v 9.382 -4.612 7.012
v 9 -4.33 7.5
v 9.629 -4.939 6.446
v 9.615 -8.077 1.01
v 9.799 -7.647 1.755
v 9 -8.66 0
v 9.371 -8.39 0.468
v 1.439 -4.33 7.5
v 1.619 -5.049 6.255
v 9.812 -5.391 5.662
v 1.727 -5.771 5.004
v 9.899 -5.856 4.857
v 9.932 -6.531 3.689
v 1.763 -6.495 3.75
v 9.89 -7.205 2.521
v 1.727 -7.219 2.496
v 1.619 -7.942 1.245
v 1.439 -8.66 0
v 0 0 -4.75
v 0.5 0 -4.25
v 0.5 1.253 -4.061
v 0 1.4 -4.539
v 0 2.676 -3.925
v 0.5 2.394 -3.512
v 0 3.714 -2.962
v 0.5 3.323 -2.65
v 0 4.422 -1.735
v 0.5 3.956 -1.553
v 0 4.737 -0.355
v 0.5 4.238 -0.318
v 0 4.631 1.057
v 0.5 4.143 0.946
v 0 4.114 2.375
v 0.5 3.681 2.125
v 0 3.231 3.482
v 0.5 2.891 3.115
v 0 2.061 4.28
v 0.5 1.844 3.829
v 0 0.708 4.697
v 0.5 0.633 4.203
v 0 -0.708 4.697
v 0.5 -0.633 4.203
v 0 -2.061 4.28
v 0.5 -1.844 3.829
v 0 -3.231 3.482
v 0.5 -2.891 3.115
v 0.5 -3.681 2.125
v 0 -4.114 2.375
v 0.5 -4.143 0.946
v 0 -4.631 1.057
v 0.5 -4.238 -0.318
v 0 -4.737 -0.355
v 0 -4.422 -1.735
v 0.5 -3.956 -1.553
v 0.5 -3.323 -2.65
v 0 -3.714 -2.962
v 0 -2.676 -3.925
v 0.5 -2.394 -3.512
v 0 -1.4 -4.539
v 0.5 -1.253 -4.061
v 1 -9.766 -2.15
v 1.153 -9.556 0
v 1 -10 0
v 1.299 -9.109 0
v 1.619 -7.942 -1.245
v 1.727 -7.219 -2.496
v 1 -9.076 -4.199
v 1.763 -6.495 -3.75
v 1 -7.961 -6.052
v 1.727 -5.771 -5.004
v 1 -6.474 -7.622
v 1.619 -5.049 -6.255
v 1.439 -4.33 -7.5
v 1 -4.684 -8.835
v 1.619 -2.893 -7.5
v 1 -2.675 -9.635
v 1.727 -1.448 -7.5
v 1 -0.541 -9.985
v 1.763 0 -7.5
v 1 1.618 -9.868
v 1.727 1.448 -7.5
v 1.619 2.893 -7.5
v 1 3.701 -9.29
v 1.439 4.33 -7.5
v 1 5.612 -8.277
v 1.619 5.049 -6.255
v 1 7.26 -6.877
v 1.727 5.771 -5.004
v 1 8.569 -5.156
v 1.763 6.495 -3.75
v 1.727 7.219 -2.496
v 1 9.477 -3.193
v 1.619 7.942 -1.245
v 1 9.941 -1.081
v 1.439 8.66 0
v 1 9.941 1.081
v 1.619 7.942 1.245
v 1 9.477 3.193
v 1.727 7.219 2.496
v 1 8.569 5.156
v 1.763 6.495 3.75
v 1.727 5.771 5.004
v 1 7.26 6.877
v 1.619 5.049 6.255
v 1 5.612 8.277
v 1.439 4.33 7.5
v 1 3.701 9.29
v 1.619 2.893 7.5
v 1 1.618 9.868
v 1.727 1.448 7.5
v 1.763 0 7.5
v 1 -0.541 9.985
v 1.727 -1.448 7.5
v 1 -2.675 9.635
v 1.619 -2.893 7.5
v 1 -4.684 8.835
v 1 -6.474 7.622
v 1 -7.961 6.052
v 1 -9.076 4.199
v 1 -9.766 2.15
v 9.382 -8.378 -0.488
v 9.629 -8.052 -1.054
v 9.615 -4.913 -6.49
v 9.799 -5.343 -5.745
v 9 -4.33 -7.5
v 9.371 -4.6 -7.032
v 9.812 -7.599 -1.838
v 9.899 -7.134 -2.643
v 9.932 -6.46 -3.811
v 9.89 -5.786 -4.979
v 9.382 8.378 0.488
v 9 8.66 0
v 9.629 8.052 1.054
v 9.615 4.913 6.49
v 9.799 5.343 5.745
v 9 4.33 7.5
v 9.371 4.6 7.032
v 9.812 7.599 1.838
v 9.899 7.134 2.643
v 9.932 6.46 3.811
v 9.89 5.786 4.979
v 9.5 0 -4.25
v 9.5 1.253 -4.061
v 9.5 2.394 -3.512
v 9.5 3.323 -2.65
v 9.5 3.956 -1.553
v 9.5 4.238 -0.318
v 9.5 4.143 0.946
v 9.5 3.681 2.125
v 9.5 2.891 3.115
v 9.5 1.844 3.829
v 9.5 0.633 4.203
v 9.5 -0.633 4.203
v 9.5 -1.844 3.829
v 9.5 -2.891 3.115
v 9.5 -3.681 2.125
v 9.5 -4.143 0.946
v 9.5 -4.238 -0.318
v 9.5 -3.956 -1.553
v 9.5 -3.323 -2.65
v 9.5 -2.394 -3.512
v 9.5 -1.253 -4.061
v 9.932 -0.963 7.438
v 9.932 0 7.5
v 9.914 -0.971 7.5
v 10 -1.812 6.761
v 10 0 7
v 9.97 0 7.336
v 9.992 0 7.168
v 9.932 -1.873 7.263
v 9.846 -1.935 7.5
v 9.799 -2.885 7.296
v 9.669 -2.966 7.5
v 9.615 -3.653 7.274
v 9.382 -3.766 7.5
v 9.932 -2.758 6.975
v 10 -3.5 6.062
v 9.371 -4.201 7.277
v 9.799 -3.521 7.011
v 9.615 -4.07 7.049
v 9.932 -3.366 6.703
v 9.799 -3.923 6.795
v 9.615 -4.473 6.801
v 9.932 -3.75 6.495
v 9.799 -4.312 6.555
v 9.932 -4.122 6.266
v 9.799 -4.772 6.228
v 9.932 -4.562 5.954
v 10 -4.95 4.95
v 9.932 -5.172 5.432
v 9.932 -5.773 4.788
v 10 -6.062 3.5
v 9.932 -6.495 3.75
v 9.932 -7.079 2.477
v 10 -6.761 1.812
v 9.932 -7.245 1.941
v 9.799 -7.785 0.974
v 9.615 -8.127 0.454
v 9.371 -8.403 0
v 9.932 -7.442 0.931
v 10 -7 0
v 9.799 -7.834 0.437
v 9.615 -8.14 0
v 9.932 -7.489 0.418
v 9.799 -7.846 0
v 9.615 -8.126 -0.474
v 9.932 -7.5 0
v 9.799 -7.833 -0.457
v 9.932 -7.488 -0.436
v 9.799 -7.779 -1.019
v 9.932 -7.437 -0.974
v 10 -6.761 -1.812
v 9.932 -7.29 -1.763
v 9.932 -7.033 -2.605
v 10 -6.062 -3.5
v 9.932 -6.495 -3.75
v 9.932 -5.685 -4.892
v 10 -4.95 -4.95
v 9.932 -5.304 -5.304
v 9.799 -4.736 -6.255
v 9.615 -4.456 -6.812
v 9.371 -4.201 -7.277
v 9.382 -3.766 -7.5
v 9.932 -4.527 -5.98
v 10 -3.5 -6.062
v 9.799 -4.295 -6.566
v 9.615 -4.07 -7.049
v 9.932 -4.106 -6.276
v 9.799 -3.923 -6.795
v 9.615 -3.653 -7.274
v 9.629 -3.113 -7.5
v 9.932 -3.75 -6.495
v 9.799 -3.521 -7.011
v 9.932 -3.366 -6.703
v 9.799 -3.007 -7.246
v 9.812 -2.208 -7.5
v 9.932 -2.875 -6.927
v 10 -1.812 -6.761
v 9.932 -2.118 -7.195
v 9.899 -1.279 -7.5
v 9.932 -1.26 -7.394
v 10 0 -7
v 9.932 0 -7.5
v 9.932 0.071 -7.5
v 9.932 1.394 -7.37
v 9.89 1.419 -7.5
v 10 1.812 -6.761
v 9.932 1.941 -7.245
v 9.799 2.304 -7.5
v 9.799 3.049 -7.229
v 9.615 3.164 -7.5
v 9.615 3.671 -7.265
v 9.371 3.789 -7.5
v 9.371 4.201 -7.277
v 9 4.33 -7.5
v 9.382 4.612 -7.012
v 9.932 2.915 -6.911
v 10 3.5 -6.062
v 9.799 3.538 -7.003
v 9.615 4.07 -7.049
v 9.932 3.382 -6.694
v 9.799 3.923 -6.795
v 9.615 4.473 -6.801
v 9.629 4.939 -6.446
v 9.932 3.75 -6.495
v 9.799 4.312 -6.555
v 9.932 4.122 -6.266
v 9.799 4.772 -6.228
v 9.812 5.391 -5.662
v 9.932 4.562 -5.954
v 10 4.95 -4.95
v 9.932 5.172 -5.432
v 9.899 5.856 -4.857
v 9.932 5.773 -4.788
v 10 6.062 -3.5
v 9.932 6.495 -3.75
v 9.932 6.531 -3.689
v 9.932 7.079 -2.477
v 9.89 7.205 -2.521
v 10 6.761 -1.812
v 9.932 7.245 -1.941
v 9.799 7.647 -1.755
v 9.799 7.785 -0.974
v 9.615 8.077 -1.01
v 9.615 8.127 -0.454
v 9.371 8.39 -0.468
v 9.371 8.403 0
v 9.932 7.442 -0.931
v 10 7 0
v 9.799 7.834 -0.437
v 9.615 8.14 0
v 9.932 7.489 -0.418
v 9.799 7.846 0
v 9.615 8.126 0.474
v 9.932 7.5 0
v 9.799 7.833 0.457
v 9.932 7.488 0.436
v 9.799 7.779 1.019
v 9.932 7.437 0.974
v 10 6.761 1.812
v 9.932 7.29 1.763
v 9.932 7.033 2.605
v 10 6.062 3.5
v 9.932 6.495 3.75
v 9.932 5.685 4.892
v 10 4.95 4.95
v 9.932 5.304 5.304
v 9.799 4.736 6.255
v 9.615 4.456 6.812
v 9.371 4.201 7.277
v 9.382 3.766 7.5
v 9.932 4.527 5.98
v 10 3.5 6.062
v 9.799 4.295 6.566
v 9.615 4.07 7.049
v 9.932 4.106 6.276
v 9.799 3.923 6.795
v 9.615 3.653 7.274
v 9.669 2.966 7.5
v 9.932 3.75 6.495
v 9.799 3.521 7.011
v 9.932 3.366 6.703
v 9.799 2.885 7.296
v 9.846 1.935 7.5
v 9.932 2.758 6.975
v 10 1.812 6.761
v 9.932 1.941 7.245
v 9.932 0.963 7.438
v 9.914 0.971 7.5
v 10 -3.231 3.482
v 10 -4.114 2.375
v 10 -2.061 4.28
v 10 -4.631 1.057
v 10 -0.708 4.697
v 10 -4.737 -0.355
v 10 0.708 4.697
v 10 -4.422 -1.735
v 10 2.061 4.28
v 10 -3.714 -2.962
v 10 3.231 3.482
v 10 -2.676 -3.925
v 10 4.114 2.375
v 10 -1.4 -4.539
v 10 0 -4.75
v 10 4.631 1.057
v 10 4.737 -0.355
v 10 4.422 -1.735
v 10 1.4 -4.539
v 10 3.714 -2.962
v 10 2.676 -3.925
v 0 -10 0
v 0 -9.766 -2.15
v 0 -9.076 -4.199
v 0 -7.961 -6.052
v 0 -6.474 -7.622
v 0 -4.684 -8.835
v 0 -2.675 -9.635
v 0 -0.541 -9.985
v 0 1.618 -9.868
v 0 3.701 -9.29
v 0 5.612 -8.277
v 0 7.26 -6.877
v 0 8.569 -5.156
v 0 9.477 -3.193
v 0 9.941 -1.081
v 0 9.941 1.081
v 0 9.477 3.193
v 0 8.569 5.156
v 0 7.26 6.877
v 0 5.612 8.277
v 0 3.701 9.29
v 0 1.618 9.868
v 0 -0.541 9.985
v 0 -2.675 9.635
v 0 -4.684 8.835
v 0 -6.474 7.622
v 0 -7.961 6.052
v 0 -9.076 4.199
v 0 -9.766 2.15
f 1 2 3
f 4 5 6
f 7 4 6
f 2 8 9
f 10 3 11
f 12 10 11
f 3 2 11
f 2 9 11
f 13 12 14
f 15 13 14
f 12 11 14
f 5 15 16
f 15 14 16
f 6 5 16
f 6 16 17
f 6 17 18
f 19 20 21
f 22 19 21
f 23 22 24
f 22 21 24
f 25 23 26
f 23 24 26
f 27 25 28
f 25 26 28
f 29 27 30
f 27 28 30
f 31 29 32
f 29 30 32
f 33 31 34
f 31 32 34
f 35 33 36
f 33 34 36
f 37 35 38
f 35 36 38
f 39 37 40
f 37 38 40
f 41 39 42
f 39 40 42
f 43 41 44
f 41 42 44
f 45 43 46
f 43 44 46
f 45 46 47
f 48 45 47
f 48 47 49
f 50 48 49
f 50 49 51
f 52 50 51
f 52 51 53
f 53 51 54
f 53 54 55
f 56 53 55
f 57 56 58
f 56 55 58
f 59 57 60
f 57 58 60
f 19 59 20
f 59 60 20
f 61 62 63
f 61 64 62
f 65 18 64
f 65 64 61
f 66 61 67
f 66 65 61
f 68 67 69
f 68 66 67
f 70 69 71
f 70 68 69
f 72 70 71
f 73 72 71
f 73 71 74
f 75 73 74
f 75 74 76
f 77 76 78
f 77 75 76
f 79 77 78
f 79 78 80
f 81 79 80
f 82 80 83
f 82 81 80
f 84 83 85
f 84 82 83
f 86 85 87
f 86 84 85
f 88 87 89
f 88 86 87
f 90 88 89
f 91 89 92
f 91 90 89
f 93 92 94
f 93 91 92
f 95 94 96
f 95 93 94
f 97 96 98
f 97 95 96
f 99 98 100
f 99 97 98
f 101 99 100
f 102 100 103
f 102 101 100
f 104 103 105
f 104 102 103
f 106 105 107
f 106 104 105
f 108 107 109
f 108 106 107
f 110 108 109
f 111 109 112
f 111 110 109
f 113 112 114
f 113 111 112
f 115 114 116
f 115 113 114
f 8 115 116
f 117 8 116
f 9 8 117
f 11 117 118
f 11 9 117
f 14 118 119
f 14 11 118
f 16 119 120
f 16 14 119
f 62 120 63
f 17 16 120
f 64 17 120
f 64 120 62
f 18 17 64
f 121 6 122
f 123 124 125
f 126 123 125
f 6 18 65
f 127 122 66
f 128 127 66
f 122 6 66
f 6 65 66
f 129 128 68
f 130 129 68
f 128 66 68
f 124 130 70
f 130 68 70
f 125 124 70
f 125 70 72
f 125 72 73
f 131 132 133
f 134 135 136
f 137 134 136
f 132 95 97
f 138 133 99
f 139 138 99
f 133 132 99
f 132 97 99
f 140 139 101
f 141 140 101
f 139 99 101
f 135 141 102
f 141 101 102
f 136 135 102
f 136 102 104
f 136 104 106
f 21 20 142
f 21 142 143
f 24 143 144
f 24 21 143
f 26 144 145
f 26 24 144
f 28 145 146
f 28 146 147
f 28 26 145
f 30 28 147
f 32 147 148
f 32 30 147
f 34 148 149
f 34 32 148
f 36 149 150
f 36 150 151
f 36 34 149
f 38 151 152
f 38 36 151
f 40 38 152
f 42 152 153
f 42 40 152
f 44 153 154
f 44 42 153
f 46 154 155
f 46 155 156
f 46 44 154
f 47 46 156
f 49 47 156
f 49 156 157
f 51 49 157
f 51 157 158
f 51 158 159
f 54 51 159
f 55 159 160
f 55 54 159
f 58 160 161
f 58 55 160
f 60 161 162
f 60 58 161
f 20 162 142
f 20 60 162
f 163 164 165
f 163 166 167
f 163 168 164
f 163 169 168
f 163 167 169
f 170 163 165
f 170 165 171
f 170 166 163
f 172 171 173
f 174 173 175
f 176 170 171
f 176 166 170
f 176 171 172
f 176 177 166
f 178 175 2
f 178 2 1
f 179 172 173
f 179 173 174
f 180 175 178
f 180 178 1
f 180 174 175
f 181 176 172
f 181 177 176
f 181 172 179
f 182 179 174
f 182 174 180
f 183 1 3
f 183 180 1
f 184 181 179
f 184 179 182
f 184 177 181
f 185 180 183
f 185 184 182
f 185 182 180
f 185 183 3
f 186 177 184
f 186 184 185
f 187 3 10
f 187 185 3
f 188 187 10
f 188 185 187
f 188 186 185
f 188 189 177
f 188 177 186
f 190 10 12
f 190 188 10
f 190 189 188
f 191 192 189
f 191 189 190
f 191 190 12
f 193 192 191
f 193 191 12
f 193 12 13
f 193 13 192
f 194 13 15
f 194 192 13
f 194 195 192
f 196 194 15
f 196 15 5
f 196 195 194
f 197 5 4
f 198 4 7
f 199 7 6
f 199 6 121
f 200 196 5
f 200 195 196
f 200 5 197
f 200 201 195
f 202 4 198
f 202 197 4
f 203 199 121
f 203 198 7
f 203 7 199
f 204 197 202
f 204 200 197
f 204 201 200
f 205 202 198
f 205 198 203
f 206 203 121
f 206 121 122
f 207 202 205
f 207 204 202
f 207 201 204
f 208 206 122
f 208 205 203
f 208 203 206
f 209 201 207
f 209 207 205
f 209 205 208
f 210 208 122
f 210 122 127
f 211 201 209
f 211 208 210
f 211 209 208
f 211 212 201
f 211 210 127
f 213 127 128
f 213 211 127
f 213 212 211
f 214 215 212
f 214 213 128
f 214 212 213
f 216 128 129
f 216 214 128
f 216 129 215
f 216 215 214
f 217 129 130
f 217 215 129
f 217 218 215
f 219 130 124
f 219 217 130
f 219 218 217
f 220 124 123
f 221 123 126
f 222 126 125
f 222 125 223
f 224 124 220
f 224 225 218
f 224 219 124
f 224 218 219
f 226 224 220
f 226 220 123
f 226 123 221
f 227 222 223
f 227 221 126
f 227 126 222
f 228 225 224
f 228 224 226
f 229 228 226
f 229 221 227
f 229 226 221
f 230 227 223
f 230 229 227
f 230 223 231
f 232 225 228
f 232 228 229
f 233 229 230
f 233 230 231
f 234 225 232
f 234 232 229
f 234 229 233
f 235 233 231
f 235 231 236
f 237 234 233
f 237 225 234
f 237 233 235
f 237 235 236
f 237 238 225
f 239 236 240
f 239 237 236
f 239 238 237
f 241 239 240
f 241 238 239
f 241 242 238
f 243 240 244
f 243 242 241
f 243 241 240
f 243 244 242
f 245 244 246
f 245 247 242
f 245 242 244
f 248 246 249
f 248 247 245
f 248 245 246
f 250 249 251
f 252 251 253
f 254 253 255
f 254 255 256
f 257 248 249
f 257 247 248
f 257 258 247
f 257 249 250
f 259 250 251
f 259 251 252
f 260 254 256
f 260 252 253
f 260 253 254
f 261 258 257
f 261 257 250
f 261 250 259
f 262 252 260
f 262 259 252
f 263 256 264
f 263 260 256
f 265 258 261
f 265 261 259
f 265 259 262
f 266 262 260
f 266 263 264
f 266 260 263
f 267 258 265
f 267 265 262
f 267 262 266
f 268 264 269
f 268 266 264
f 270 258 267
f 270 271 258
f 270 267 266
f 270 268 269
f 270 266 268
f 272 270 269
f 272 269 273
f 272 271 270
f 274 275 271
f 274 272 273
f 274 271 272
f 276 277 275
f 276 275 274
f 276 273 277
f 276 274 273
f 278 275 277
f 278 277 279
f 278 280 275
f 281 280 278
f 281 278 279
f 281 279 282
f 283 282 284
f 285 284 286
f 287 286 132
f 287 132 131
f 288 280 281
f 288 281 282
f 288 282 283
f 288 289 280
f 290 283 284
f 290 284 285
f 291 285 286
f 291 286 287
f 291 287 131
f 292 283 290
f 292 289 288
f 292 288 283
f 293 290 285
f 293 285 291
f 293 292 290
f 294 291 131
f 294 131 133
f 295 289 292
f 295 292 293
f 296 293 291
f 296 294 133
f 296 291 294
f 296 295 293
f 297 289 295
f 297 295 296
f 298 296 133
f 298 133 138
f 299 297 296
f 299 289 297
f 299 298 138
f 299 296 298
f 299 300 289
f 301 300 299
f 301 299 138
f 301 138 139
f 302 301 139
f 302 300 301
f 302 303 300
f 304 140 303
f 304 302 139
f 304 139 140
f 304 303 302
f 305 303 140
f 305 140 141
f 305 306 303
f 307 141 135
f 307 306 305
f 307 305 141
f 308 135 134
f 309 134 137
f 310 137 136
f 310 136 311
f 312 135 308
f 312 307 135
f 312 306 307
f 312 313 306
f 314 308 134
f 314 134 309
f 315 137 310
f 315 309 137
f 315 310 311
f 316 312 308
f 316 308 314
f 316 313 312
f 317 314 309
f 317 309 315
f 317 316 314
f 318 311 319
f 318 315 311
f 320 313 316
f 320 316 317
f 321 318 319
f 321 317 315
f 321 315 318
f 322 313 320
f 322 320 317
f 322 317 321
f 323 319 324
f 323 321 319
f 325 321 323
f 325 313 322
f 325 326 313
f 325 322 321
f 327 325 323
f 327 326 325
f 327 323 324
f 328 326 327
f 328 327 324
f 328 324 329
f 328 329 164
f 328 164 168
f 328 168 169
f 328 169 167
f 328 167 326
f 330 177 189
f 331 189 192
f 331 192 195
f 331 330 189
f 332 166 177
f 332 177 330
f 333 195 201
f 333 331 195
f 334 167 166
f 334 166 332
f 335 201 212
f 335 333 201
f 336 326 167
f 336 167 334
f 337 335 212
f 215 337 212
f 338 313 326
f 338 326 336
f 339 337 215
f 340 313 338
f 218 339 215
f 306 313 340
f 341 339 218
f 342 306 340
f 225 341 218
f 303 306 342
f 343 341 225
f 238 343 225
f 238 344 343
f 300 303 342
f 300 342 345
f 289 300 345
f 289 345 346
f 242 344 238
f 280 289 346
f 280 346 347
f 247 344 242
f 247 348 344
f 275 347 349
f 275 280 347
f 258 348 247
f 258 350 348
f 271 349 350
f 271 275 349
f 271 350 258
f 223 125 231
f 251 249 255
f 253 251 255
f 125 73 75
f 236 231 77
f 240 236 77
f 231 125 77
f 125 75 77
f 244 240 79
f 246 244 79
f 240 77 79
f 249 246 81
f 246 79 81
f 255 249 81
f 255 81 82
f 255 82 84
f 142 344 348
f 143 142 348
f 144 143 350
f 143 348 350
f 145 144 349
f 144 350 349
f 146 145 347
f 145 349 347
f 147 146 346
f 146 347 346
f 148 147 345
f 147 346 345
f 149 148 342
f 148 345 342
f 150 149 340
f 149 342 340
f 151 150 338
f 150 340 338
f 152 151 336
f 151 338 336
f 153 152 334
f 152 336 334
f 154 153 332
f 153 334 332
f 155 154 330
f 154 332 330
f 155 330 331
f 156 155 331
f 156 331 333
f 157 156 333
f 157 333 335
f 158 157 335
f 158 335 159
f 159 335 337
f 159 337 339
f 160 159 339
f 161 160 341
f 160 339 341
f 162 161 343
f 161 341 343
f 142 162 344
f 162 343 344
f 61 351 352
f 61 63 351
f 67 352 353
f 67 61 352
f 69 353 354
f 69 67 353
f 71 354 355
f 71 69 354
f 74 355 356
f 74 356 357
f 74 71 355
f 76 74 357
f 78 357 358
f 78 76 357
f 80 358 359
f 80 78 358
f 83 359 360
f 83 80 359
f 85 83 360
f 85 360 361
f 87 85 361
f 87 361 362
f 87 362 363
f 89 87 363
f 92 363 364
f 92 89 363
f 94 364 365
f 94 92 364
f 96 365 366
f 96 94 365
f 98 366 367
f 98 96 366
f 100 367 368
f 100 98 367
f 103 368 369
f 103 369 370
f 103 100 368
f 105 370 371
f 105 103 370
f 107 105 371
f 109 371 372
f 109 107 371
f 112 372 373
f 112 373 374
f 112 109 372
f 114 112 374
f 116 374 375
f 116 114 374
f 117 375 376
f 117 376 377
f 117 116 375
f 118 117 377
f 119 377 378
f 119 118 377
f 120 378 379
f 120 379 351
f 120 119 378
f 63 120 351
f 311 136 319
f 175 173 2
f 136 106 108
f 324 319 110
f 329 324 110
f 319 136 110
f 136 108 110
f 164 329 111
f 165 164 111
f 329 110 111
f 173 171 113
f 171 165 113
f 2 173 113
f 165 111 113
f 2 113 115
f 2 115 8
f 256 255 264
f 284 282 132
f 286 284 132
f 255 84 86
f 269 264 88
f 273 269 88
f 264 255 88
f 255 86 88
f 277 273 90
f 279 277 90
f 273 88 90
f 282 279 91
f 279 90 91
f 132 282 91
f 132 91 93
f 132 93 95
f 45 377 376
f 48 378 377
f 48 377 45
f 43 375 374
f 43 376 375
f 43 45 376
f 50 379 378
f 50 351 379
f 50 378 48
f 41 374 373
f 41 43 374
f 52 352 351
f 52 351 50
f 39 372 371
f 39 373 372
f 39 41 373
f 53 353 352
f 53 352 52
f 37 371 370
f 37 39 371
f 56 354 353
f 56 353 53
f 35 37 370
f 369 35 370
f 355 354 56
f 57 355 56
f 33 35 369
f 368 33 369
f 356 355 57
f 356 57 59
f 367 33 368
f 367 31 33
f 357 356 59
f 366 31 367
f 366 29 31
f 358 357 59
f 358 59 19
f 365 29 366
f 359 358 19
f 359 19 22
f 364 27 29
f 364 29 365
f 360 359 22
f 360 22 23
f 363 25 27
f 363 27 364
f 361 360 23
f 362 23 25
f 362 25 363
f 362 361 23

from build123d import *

# Parameters (mm, degrees)
EXTRUSION1_DEPTH        = 10
ESQUISSE4_R             = 4.25
ENL_V_MAT_EXTRU_2_DEPTH = 10
CHANFREIN1_SIZE         = 0.5


with BuildPart() as part:
    # Esquisse1 → Extrusion1 (new body)
    with BuildSketch(Plane(origin=(0, 0, 0), x_dir=(0, 0, -1), z_dir=(1, 0, 0))):
        Polygon((0, 8.660254038), (-7.5, 4.330127019), (-7.5, -4.330127019), (0, -8.660254038), (7.5, -4.330127019), (7.5, 4.330127019), align=None)
    extrude(amount=EXTRUSION1_DEPTH)

    # Esquisse2 → Enlèvement de matière-Révolution1 (revolve, cut)
    with BuildSketch(Plane.XY, mode=Mode.PRIVATE) as enl_vement_de_mati_re_r_volution1_sk:
        with BuildLine():
            Line((10, 8.660254038), (9, 8.660254038))
            ThreePointArc((9, 8.660254038), (9.730692812, 7.969077328), (10, 7))
            Line((10, 7), (10, 8.660254038))
        make_face()
    revolve(enl_vement_de_mati_re_r_volution1_sk.sketch.rotate(Axis((0, 0, 0), (1, 0, 0)), 90), axis=Axis((0, 0, 0), (1, 0, 0)), mode=Mode.SUBTRACT)  # turned: the seam where the file's is

    # Esquisse3 → Révolution1 (revolve)
    with BuildSketch(Plane.XY, mode=Mode.PRIVATE) as r_volution1_sk:
        with BuildLine():
            Line((0, 0), (0, 10))
            Line((0, 10), (1, 10))
            ThreePointArc((1, 10), (2.283685542, 5.073059362), (2.715728753, 0))
            Line((2.715728753, 0), (0, 0))
        make_face()
    revolve(r_volution1_sk.sketch.rotate(Axis((0, 0, 0), (1, 0, 0)), 180), axis=Axis((0, 0, 0), (1, 0, 0)))  # turned: the seam where the file's is

    # Esquisse4 → Enlèv. mat.-Extru.2 (cut)
    with BuildSketch(Plane(origin=(0, 0, 0), x_dir=(0, 0, -1), z_dir=(1, 0, 0))):
        Circle(ESQUISSE4_R)
    extrude(amount=ENL_V_MAT_EXTRU_2_DEPTH, mode=Mode.SUBTRACT)

    # Chanfrein1
    chanfrein1_edges = [part.edges().sort_by_distance(p)[0] for p in [
        (0, 0, 4.25),
        (10, 0, 4.25),
    ]]
    chamfer(chanfrein1_edges, length=CHANFREIN1_SIZE)


solid = part.part
